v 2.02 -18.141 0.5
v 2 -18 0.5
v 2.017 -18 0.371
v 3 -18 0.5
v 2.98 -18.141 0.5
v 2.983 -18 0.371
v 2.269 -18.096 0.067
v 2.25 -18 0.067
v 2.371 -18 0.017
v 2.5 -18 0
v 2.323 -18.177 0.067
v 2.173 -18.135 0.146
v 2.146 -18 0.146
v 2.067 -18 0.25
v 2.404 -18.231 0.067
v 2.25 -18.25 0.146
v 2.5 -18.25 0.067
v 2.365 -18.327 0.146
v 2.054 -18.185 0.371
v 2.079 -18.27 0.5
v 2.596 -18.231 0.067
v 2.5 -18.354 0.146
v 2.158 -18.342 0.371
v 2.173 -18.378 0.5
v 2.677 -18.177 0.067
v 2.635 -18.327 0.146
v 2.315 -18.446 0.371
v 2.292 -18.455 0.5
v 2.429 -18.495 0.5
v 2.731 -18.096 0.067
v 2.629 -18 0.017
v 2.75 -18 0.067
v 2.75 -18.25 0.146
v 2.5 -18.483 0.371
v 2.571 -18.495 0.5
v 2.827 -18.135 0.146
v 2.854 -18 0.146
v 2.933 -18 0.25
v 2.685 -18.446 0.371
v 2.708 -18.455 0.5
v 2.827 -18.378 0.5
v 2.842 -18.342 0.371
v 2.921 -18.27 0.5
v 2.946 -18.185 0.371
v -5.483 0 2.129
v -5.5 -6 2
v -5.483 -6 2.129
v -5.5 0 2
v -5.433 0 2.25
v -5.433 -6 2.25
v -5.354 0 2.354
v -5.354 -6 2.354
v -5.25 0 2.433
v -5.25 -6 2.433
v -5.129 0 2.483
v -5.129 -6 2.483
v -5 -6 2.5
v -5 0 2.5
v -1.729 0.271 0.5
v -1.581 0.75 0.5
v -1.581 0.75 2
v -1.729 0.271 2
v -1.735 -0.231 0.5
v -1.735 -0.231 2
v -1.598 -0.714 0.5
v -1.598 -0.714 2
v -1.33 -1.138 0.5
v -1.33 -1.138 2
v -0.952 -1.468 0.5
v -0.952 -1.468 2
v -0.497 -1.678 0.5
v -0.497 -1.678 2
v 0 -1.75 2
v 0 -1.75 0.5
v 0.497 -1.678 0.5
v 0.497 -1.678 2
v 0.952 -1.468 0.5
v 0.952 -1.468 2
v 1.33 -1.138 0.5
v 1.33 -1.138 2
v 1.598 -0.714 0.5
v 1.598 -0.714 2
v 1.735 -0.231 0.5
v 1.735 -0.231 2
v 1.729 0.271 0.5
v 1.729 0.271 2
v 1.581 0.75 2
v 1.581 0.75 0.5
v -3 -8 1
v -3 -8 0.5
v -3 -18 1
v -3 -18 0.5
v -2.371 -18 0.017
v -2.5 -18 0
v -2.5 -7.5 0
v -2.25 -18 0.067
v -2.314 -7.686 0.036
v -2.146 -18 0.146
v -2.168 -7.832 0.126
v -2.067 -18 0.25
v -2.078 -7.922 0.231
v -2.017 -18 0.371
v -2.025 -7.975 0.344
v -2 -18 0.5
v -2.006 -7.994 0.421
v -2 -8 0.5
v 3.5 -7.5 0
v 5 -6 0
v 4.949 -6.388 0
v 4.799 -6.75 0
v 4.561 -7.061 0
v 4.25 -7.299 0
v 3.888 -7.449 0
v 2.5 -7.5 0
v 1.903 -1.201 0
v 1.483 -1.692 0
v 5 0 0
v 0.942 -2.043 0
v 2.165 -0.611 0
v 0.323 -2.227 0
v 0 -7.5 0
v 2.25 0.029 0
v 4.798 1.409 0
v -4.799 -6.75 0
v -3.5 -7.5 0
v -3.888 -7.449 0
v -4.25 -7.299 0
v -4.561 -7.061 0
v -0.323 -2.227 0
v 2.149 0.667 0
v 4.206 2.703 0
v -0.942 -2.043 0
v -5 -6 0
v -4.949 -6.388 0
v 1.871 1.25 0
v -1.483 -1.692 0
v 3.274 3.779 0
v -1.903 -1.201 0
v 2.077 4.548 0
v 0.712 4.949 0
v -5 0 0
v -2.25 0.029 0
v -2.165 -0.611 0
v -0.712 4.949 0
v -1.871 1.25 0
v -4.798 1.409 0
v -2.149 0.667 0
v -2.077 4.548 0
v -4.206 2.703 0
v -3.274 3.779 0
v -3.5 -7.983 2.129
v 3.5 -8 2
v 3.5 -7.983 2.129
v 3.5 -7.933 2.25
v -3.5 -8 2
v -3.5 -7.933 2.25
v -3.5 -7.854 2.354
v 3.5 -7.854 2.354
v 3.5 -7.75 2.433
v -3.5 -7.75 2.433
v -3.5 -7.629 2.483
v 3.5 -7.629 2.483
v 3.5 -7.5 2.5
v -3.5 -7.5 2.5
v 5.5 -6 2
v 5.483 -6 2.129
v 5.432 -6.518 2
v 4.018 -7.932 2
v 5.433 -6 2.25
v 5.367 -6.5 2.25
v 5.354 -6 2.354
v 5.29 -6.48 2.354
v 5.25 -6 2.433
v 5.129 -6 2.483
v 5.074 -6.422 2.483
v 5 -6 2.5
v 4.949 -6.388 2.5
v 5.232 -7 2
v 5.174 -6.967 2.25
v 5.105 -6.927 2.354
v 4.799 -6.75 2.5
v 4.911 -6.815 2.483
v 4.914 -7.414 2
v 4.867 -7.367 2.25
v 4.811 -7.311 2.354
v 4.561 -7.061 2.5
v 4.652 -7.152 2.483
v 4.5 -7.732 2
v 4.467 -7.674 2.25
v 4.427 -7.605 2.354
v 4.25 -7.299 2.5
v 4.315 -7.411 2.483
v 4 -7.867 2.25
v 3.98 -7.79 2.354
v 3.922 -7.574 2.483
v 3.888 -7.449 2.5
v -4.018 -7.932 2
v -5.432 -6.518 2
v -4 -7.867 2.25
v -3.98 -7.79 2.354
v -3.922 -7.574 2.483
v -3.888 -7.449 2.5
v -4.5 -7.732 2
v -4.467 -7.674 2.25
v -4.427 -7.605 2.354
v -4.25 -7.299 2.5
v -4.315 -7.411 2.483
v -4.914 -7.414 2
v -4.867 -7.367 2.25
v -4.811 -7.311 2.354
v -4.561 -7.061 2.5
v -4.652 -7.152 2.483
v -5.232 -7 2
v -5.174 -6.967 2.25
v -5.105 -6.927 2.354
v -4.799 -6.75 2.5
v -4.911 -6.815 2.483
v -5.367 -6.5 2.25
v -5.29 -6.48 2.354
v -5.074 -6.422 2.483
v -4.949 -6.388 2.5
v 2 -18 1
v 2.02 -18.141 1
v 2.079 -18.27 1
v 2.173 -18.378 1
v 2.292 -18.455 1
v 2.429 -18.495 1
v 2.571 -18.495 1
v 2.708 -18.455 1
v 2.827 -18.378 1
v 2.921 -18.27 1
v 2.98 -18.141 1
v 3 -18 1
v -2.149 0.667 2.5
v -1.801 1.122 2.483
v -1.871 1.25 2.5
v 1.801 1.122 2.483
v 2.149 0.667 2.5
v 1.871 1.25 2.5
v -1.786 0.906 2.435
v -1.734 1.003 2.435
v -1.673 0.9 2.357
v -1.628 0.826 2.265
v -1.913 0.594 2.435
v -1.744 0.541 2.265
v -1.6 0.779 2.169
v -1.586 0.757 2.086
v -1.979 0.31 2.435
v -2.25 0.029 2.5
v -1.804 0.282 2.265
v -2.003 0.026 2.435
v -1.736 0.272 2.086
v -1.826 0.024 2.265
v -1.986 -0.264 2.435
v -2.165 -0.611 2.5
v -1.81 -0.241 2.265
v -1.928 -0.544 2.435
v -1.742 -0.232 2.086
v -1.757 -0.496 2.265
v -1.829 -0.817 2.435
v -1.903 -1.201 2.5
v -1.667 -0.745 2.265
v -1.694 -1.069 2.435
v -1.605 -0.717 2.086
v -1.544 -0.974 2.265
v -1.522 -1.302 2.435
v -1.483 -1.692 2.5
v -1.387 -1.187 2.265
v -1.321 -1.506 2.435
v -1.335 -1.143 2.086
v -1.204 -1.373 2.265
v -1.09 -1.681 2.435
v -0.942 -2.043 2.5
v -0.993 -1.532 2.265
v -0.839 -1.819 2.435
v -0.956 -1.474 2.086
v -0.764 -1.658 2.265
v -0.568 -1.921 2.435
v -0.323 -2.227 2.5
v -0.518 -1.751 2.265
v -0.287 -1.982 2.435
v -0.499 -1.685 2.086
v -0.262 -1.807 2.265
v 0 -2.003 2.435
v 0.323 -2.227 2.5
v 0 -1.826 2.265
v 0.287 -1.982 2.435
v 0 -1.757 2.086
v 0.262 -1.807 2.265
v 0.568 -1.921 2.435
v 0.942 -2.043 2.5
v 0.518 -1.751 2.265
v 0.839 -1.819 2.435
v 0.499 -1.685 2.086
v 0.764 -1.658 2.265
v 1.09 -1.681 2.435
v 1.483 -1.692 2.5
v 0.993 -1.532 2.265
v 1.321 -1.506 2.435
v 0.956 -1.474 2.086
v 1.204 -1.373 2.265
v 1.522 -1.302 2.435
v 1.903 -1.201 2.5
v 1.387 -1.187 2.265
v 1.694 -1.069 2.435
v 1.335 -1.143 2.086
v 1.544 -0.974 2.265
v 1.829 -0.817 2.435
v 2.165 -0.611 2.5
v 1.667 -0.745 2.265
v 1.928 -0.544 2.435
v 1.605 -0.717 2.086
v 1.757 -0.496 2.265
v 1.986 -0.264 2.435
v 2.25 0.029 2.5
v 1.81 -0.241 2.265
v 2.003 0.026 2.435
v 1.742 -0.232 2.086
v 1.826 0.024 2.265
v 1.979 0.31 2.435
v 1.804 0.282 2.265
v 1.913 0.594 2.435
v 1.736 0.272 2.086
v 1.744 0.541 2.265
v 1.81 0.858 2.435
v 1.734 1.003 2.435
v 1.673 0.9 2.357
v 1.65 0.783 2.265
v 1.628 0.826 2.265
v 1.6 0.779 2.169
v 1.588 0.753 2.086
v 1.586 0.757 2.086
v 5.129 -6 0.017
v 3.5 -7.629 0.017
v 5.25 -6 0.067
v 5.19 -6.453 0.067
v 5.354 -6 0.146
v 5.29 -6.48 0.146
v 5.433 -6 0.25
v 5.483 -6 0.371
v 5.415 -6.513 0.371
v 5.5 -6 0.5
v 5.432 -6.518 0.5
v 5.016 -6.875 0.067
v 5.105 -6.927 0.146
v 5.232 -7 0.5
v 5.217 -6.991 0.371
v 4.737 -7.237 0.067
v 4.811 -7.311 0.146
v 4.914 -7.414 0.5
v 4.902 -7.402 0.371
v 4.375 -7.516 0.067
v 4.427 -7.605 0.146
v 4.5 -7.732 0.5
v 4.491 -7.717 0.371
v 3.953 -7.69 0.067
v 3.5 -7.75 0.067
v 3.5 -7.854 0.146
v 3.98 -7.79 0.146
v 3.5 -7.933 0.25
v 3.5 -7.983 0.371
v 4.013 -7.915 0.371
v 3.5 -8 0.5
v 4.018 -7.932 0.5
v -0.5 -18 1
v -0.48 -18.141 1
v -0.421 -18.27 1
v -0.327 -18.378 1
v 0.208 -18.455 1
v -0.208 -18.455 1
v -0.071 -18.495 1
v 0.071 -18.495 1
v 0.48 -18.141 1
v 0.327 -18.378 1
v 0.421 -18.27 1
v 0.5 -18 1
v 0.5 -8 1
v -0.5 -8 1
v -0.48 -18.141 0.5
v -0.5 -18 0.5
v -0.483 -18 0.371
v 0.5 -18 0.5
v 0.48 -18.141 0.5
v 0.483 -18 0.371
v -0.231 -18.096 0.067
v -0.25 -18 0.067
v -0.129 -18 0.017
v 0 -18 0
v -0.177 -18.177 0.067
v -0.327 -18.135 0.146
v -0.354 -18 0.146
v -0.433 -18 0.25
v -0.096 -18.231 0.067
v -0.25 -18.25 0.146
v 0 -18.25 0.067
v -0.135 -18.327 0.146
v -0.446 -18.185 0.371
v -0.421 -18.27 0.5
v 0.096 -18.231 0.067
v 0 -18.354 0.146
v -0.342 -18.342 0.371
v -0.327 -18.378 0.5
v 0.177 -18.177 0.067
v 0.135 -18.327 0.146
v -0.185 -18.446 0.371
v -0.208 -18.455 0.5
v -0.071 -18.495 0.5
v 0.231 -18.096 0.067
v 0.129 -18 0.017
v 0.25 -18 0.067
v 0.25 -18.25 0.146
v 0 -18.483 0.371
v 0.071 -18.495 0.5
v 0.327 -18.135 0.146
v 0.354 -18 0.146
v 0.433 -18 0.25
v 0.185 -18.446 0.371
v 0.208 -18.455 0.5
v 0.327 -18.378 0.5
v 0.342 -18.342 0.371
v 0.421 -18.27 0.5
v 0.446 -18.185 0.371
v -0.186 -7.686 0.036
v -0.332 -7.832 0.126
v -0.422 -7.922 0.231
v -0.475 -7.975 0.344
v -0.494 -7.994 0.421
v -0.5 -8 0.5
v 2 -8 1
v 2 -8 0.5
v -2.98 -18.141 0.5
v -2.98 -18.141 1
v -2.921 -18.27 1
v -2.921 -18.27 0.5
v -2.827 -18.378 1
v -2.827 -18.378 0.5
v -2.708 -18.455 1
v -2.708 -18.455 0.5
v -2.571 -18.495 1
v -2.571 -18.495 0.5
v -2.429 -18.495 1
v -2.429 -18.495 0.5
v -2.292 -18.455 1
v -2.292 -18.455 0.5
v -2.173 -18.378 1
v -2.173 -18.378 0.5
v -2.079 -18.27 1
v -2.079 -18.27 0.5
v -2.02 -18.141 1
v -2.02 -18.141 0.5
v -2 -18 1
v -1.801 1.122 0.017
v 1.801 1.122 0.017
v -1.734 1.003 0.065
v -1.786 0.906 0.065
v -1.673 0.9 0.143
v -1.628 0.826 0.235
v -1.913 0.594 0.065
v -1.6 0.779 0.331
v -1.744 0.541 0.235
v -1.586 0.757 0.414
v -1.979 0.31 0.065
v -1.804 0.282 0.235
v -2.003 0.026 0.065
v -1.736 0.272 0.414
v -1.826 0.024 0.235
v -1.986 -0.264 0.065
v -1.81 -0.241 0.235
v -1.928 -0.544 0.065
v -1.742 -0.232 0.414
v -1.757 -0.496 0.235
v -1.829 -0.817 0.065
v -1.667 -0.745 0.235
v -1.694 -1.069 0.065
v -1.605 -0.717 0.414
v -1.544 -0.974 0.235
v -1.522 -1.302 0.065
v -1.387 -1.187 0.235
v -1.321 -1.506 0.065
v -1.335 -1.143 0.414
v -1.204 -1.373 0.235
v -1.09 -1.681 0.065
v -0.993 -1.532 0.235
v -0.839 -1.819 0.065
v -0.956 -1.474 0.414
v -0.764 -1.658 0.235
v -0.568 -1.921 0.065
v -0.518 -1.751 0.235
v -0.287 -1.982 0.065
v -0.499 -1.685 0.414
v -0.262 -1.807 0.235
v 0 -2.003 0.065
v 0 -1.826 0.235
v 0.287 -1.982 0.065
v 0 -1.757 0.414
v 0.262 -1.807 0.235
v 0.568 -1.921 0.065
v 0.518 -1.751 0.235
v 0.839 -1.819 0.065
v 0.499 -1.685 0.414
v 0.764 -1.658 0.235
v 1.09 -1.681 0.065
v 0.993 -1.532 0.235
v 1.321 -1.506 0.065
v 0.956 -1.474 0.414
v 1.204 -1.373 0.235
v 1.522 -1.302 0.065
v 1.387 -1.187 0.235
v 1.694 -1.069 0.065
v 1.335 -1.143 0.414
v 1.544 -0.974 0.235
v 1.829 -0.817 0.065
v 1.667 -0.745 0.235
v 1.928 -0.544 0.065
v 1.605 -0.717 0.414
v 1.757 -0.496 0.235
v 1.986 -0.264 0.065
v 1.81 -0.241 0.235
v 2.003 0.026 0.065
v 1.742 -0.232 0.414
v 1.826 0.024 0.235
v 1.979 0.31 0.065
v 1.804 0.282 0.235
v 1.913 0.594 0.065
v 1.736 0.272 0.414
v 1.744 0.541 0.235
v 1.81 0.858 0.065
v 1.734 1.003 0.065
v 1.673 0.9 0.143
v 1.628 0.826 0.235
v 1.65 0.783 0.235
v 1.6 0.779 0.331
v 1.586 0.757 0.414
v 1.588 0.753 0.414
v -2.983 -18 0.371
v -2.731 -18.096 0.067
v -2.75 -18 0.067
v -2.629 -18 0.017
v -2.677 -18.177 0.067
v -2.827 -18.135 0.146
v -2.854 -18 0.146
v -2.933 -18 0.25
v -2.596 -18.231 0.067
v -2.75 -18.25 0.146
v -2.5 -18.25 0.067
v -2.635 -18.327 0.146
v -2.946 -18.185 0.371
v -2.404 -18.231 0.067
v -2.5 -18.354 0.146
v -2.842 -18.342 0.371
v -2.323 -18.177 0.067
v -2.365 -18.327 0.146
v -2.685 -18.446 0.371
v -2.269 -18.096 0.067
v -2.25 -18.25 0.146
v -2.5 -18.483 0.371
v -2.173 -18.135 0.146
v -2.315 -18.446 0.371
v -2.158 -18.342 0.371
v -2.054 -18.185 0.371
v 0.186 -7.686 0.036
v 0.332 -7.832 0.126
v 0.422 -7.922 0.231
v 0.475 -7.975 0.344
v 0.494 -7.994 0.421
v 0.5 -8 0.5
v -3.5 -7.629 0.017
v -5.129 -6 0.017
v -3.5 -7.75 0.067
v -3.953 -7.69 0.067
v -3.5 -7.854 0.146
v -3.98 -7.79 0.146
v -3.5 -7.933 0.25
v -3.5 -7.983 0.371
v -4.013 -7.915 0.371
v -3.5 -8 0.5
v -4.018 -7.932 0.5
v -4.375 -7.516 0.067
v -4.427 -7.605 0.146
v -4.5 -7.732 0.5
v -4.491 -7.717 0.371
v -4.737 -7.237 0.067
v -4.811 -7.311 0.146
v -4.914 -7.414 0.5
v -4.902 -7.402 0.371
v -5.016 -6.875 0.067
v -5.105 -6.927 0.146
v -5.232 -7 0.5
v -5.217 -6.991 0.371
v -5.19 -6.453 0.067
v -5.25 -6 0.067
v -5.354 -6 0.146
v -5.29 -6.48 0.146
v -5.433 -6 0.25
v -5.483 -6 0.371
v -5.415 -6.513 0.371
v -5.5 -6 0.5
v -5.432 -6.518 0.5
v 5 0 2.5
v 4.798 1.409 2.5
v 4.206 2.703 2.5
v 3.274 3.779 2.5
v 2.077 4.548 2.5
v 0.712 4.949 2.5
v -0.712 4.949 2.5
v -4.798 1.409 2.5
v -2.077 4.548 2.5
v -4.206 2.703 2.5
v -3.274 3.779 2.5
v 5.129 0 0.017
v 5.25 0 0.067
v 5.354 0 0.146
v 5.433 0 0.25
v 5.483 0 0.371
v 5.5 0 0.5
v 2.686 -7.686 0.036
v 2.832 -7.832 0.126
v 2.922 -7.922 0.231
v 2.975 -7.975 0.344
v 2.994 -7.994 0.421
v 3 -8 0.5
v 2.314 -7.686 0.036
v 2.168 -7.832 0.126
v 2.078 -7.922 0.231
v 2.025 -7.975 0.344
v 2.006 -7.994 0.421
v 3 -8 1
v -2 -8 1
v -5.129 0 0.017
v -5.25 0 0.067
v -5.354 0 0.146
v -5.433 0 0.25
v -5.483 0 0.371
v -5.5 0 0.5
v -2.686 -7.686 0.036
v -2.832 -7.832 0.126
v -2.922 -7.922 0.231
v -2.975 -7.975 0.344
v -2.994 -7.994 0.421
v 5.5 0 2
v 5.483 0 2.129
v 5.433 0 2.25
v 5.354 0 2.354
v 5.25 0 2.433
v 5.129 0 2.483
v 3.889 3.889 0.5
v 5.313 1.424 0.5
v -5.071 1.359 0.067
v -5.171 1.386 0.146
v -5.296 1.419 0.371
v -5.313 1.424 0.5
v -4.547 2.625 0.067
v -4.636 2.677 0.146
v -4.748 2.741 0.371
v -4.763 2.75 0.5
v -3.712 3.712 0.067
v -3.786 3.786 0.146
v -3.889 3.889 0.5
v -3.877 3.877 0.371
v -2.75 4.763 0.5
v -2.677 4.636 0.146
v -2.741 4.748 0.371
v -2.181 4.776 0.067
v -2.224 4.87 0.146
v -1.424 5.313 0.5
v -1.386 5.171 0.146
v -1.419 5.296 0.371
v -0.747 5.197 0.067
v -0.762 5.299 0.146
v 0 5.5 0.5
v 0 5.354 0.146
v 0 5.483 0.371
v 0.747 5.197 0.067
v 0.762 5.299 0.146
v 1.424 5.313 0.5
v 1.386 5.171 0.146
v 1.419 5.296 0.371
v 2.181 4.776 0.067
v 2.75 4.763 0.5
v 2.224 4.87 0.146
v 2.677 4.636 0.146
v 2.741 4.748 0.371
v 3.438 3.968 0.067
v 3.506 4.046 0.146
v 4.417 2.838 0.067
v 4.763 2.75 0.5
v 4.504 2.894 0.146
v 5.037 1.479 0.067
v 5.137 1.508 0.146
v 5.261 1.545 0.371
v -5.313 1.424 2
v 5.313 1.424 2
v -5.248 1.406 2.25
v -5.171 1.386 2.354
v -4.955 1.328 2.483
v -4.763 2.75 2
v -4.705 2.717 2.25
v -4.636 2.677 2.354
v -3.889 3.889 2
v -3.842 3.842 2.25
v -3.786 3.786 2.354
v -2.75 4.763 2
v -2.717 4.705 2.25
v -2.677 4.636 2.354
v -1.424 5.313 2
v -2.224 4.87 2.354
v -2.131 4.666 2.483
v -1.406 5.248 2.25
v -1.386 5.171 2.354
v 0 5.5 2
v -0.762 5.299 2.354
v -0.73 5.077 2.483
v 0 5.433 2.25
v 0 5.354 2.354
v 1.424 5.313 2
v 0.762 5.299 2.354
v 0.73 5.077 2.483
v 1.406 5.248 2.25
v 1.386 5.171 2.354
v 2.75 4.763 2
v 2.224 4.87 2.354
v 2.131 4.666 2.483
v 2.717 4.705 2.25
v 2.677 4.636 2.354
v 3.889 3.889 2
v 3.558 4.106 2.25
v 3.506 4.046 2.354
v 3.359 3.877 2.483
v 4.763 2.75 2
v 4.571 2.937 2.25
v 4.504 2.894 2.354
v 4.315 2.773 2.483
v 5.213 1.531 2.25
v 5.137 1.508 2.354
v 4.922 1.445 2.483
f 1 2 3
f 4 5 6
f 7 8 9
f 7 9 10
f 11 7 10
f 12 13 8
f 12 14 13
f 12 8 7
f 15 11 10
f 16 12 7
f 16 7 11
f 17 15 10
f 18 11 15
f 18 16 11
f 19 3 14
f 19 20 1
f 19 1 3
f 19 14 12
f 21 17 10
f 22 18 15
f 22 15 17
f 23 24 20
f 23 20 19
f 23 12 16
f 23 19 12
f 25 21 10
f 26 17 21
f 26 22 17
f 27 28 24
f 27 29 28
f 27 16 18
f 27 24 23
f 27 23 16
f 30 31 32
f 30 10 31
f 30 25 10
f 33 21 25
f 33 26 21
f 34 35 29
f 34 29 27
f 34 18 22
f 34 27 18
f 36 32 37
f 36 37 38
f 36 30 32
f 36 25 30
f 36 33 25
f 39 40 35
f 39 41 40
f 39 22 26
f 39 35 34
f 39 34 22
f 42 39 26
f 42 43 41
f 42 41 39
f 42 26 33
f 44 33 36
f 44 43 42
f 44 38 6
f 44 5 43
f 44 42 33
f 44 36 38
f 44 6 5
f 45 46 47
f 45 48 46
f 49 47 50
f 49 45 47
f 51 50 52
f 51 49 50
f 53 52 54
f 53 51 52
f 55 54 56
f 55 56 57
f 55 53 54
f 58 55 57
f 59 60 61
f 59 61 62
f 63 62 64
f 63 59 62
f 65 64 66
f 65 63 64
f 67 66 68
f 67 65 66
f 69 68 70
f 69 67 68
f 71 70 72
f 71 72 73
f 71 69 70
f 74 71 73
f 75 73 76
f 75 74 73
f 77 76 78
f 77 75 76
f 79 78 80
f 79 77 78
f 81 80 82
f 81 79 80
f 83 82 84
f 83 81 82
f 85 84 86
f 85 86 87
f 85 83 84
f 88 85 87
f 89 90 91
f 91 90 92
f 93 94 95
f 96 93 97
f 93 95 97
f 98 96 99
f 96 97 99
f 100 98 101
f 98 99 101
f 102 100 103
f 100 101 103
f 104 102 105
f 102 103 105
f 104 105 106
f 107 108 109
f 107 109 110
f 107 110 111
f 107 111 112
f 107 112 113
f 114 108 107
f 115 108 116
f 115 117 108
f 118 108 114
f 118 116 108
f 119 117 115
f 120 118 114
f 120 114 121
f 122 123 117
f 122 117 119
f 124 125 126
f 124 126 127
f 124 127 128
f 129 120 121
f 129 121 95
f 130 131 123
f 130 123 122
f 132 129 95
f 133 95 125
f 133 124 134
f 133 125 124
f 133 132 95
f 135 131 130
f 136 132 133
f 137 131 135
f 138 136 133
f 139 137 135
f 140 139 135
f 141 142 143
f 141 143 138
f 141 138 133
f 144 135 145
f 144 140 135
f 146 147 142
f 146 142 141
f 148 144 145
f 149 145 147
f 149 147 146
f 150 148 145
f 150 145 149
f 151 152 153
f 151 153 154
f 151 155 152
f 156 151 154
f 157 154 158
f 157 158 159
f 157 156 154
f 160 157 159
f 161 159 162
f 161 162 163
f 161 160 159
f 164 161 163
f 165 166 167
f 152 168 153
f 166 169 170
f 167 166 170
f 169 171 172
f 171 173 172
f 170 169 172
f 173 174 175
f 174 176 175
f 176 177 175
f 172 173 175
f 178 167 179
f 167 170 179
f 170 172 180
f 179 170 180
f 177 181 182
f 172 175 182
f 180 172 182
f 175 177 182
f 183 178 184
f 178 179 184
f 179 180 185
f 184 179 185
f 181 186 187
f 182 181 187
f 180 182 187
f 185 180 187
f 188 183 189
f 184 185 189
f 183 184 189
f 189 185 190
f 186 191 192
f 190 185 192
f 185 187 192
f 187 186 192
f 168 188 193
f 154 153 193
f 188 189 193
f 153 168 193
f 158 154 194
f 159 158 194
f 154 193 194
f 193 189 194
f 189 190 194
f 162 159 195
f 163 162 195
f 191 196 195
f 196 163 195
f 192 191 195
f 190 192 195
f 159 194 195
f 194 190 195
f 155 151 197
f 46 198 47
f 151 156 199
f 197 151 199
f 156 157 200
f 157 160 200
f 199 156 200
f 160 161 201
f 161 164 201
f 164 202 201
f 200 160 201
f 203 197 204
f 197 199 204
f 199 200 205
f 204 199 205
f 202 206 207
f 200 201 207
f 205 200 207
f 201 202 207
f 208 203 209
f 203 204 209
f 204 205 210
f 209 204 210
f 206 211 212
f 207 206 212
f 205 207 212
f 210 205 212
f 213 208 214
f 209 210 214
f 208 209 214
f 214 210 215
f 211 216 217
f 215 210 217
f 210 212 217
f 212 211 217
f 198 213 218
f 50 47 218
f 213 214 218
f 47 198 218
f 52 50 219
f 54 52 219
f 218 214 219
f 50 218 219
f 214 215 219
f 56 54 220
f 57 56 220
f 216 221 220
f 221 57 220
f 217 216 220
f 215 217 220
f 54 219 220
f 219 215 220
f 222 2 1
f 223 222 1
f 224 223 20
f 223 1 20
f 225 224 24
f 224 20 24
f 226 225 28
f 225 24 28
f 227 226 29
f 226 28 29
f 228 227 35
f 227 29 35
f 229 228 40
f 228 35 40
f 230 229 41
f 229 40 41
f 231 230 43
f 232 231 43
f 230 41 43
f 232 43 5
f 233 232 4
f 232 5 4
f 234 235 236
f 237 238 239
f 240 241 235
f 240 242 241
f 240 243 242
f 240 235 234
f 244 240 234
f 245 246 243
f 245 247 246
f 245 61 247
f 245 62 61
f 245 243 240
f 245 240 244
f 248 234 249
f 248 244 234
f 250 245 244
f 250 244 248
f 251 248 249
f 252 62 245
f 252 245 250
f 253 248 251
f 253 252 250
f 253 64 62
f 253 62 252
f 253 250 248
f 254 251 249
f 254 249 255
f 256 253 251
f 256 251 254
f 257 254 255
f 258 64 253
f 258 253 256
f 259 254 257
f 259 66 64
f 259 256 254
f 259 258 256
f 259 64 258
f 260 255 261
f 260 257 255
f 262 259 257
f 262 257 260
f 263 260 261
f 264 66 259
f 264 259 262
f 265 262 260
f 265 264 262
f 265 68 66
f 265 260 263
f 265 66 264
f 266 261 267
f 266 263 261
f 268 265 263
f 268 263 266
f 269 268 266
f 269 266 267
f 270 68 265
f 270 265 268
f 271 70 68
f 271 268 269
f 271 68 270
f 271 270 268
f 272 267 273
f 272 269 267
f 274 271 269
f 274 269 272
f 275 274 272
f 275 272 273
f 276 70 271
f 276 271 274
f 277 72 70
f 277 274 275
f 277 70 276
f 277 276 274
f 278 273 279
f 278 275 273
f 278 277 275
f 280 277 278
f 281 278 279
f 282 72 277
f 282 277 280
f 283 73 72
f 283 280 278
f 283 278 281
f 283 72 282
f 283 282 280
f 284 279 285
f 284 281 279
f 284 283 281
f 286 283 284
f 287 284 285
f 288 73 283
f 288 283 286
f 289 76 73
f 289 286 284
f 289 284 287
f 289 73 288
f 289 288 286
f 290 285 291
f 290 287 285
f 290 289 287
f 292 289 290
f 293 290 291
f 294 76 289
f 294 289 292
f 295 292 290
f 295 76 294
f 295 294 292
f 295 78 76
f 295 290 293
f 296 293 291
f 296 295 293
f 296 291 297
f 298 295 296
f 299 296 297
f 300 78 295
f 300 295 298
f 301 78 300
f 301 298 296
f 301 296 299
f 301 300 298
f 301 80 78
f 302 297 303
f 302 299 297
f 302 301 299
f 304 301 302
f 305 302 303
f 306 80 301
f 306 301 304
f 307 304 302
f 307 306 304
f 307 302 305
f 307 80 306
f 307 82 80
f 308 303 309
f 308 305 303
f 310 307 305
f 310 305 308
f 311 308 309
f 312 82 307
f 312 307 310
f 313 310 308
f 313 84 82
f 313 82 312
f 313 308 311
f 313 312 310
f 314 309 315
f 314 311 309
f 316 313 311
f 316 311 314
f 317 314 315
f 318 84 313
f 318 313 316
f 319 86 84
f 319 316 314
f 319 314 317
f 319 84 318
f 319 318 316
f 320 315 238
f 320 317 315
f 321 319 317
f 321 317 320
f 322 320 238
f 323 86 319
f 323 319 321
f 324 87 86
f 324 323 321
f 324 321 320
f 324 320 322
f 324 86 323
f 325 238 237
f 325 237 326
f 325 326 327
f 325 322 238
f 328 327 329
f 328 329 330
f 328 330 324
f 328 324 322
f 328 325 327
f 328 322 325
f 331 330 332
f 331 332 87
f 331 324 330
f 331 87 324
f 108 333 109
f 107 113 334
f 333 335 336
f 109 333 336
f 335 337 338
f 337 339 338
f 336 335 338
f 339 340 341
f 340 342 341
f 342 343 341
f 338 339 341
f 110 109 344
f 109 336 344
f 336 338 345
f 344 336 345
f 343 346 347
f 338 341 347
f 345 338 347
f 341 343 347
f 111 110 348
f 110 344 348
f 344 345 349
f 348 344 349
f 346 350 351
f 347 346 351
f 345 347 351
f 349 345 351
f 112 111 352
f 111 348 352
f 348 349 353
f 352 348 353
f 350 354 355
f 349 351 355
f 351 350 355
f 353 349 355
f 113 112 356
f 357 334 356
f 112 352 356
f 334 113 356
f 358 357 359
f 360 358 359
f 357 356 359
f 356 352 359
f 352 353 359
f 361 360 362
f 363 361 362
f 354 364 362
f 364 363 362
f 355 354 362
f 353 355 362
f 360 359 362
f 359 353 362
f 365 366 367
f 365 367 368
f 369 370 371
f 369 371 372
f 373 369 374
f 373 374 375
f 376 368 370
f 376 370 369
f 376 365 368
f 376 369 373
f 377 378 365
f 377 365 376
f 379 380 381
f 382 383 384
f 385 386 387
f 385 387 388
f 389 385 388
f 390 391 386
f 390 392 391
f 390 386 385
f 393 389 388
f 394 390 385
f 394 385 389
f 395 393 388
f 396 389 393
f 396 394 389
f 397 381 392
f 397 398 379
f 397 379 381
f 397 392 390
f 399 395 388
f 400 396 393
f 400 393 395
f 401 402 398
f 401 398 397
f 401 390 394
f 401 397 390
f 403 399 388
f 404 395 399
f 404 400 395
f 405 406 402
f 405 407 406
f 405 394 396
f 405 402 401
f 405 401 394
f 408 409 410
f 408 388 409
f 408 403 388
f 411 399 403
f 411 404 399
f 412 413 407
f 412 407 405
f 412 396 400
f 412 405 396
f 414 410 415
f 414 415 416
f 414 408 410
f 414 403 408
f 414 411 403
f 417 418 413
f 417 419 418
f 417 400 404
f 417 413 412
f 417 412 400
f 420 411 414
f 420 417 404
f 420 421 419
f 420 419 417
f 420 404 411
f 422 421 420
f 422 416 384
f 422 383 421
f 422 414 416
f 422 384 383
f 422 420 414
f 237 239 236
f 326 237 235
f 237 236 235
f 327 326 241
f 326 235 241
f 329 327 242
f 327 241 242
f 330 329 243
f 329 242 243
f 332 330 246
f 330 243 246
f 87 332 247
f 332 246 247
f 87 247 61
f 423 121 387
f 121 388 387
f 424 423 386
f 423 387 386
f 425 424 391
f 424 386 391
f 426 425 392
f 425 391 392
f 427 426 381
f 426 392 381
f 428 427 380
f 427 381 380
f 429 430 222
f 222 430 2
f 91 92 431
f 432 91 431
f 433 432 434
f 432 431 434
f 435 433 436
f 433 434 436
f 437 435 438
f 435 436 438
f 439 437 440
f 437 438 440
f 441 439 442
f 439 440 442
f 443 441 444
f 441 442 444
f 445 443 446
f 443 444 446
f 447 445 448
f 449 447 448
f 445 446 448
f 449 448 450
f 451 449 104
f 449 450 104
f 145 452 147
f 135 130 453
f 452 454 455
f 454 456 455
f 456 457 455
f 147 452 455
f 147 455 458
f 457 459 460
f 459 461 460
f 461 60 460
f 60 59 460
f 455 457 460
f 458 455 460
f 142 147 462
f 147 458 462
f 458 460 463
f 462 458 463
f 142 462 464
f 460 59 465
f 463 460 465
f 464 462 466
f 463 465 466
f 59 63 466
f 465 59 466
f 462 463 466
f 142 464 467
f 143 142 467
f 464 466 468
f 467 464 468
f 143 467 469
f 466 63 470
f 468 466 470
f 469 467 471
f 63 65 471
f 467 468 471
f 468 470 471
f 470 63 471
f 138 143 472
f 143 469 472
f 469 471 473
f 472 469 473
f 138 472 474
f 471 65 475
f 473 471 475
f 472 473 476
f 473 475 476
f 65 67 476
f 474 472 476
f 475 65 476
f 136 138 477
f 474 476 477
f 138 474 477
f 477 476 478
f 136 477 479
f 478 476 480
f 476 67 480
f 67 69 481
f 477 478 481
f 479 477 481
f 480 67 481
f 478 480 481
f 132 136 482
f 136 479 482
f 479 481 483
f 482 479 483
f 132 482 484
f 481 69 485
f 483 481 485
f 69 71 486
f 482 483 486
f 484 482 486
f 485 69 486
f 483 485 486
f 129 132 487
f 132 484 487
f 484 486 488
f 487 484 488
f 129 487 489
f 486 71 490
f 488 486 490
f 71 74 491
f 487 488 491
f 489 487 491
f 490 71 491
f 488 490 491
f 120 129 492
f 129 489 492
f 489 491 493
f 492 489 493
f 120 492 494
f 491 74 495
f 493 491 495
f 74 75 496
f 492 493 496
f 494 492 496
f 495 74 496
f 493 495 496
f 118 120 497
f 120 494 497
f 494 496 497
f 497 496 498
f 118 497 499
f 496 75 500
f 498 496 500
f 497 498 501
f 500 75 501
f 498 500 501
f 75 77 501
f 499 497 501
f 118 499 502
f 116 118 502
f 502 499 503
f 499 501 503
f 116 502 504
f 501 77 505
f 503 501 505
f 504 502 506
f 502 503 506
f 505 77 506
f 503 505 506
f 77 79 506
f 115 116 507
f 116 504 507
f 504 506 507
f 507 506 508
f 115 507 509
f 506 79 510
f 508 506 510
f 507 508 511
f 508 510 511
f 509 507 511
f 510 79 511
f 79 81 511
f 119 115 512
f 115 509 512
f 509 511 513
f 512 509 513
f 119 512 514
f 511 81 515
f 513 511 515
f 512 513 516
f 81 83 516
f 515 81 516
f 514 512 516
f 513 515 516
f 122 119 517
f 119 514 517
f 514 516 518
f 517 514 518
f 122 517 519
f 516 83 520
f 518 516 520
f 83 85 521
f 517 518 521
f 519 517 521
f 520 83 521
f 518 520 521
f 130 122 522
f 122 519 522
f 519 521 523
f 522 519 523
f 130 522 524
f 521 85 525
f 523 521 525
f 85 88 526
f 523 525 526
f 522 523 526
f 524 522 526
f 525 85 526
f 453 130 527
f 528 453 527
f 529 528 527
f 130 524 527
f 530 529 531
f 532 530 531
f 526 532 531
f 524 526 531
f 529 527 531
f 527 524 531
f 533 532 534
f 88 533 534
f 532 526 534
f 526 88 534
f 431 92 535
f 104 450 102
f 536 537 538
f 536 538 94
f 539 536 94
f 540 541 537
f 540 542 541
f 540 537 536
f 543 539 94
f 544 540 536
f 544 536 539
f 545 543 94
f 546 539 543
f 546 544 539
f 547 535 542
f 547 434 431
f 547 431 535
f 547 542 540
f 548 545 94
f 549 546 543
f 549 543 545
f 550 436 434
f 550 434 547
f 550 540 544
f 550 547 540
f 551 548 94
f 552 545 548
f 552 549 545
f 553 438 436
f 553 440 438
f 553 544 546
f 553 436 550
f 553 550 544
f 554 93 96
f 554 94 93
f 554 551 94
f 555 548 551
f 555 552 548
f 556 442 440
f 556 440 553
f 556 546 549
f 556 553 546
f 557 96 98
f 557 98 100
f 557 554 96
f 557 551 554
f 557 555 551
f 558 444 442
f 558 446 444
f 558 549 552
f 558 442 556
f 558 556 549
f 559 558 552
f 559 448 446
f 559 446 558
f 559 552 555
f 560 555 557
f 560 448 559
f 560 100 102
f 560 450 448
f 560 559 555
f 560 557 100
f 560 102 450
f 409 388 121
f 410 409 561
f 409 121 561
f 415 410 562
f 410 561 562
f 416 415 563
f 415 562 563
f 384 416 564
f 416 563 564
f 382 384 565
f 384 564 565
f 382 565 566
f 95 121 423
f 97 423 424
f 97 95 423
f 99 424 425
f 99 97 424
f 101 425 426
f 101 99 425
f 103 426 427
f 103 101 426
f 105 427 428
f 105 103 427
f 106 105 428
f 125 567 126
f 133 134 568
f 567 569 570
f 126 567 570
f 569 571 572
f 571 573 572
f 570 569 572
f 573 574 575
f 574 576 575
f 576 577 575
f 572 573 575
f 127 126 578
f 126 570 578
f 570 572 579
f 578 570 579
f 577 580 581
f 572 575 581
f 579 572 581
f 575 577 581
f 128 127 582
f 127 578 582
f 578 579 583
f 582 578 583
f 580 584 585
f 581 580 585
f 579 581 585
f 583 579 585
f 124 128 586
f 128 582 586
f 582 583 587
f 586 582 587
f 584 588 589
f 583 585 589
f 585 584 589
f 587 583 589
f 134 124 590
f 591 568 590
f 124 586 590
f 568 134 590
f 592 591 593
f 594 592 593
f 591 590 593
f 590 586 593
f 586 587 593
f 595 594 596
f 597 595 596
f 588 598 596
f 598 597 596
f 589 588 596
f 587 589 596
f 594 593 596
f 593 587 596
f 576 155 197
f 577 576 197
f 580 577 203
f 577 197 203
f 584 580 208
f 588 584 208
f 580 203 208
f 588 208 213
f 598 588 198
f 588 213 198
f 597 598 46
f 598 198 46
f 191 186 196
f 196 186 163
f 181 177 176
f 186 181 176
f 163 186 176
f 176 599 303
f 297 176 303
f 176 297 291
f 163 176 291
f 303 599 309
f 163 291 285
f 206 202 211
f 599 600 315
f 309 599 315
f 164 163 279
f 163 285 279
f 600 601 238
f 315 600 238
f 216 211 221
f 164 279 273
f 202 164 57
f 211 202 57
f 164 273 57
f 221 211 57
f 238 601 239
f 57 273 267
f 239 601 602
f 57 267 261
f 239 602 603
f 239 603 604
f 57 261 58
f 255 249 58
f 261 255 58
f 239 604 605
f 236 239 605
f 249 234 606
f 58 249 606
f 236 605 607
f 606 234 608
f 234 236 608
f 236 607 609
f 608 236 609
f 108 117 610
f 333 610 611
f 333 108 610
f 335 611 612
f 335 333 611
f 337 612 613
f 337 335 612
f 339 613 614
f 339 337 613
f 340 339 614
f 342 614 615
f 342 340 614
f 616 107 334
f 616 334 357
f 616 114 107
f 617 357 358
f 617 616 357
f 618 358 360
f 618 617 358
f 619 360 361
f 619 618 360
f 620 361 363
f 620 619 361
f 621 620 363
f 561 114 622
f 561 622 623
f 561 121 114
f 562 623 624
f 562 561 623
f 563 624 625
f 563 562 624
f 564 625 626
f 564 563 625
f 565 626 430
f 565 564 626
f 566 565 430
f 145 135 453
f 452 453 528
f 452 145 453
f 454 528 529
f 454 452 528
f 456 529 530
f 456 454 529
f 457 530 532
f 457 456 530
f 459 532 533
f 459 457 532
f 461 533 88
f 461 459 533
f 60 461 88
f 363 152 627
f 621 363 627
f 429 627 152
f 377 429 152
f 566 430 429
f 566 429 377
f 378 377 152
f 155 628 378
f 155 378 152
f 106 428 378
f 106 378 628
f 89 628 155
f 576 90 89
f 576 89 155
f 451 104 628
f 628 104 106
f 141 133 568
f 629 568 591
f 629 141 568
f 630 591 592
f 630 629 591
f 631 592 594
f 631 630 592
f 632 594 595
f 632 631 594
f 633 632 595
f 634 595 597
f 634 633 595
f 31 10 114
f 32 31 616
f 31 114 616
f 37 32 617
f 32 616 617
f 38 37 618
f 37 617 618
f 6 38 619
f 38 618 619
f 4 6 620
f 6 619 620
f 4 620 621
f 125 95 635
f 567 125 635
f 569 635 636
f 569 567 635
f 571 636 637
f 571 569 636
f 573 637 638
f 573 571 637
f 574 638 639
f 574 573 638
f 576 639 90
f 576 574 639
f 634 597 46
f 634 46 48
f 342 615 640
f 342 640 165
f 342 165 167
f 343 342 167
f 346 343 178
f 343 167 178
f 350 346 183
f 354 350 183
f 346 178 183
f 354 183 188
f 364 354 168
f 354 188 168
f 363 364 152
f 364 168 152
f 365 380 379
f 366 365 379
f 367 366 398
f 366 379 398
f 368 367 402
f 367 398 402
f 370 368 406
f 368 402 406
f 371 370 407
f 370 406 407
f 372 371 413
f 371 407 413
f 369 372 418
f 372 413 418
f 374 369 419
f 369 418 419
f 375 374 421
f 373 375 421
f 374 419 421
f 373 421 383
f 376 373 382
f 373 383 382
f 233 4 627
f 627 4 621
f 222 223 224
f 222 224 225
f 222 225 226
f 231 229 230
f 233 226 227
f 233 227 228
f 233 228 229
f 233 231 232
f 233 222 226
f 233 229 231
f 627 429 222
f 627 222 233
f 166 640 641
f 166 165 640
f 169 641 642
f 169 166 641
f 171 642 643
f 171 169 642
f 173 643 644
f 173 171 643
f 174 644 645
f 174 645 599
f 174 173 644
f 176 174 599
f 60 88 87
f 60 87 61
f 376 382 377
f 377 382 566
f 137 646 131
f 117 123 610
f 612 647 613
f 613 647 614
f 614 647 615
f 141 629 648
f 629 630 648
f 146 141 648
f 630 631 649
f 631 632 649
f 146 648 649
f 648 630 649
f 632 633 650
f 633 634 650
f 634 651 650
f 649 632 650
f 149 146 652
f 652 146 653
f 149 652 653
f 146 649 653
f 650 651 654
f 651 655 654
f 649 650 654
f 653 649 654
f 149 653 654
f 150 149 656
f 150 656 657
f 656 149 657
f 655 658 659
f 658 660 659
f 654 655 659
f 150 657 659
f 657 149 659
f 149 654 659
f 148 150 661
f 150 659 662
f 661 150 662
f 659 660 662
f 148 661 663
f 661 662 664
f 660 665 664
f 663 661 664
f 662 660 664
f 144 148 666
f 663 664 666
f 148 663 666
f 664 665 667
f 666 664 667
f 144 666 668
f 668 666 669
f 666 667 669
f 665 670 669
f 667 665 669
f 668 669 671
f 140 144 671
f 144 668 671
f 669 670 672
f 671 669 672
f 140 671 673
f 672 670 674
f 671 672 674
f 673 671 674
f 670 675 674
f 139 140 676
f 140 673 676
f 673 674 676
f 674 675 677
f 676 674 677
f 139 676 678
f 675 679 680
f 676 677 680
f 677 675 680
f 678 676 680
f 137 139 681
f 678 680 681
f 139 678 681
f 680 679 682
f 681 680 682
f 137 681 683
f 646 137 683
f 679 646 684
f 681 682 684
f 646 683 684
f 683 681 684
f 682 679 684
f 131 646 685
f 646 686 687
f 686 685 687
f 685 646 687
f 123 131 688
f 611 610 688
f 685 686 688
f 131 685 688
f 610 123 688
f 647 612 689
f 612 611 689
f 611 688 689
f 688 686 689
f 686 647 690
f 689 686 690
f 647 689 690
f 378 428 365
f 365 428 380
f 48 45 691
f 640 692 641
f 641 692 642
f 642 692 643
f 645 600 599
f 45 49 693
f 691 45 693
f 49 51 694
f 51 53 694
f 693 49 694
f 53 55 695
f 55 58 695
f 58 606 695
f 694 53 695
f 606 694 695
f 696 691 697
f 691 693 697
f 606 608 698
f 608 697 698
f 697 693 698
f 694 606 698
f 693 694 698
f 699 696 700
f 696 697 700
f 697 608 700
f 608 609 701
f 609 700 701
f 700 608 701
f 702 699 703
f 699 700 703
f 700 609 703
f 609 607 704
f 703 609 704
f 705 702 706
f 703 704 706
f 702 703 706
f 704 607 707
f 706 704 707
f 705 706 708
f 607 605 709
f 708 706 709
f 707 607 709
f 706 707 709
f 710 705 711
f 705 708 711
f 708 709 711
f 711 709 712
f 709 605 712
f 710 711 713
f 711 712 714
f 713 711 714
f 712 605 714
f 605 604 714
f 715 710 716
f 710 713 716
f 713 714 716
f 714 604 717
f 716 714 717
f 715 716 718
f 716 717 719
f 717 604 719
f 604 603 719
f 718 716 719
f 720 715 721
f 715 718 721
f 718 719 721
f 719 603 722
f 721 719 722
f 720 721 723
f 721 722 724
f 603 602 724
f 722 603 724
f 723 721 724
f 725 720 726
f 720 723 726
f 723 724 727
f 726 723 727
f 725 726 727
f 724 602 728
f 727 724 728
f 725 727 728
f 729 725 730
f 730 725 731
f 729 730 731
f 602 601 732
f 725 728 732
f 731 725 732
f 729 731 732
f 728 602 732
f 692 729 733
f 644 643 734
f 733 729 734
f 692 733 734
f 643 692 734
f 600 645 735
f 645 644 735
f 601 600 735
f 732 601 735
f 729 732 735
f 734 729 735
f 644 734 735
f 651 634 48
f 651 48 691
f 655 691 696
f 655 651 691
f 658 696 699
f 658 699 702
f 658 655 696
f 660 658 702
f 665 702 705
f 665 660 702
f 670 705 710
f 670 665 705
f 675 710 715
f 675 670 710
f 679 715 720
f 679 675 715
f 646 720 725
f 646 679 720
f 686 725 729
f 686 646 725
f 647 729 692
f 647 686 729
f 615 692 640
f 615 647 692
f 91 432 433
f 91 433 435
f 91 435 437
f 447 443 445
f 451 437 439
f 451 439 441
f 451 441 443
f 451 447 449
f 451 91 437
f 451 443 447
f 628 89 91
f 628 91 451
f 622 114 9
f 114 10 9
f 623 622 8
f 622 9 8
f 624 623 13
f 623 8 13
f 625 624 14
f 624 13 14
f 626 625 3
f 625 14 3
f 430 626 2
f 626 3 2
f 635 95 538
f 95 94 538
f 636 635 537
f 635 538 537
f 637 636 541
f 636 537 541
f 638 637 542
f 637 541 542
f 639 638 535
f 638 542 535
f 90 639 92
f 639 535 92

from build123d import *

# Parameters (mm, degrees)
BOSS_EXTRUDE1_DEPTH = 2.5
BOSS_EXTRUDE2_DEPTH = 1
FILLET1_R           = 2
FILLET2_R           = 0.5


with BuildPart() as part:
    # Sketch1 → Boss-Extrude1 (new body)
    with BuildSketch(Plane.XY):
        with BuildLine():
            Line((5.5, 0), (5.5, -8))
            Line((5.5, -8), (-5.5, -8))
            Line((-5.5, -8), (-5.5, 0))
            ThreePointArc((-5.5, 0), (0, 5.5), (5.5, 0))
        make_face()
        with BuildLine():
            ThreePointArc((-1.58113883, 0.75), (0, -1.75), (1.58113883, 0.75))
            Line((1.58113883, 0.75), (-1.58113883, 0.75))
        make_face(mode=Mode.SUBTRACT)
    extrude(amount=BOSS_EXTRUDE1_DEPTH)

    # Sketch1<3> → Boss-Extrude2 (add)
    with BuildSketch(Plane.XY):
        with BuildLine():
            Line((-2, -8), (-3, -8))
            Line((-3, -8), (-3, -18))
            ThreePointArc((-3, -18), (-2.5, -18.5), (-2, -18))
            Line((-2, -18), (-2, -8))
        make_face()
        with BuildLine():
            Line((0.5, -8), (-0.5, -8))
            Line((-0.5, -8), (-0.5, -18))
            ThreePointArc((-0.5, -18), (0, -18.5), (0.5, -18))
            Line((0.5, -18), (0.5, -8))
        make_face()
        with BuildLine():
            Line((3, -18), (3, -8))
            Line((3, -8), (2, -8))
            Line((2, -8), (2, -18))
            ThreePointArc((2, -18), (2.5, -18.5), (3, -18))
        make_face()
    extrude(amount=BOSS_EXTRUDE2_DEPTH)

    # Fillet1
    fillet1_edges = [part.edges().sort_by_distance(p)[0] for p in [
        (5.5, -8, 1.25),
        (-5.5, -8, 1.25),
    ]]
    fillet(fillet1_edges, radius=FILLET1_R)

    # Fillet2
    fillet2_edges = [part.edges().sort_by_distance(p)[0] for p in [
        (0, 0.75, 2.5),
        (0, -1.75, 0),
        (5.5, -3, 2.5),
        (0, 5.5, 2.5),
        (-3.25, -8, 0),
        (-3, -13, 0),
        (-5.5, -3, 2.5),
        (-2.5, -18.5, 0),
        (-2, -13, 0),
        (-1.25, -8, 0),
        (-0.5, -13, 0),
        (0, -18.5, 0),
        (0.5, -13, 0),
        (1.25, -8, 0),
        (2, -13, 0),
        (2.5, -18.5, 0),
        (3, -13, 0),
        (3.25, -8, 0),
        (-4.914213562, -7.414213562, 0),
        (4.914213562, -7.414213562, 0),
        (0, -8, 2.5),
        (0, -1.75, 2.5),
        (-4.914213562, -7.414213562, 2.5),
        (4.914213562, -7.414213562, 2.5),
        (-5.5, -3, 0),
        (0, 5.5, 0),
        (5.5, -3, 0),
        (0, 0.75, 0),
    ]]
    fillet(fillet2_edges, radius=FILLET2_R - 0.0001)  # a hair under: the kernel refuses the full size


solid = part.part
